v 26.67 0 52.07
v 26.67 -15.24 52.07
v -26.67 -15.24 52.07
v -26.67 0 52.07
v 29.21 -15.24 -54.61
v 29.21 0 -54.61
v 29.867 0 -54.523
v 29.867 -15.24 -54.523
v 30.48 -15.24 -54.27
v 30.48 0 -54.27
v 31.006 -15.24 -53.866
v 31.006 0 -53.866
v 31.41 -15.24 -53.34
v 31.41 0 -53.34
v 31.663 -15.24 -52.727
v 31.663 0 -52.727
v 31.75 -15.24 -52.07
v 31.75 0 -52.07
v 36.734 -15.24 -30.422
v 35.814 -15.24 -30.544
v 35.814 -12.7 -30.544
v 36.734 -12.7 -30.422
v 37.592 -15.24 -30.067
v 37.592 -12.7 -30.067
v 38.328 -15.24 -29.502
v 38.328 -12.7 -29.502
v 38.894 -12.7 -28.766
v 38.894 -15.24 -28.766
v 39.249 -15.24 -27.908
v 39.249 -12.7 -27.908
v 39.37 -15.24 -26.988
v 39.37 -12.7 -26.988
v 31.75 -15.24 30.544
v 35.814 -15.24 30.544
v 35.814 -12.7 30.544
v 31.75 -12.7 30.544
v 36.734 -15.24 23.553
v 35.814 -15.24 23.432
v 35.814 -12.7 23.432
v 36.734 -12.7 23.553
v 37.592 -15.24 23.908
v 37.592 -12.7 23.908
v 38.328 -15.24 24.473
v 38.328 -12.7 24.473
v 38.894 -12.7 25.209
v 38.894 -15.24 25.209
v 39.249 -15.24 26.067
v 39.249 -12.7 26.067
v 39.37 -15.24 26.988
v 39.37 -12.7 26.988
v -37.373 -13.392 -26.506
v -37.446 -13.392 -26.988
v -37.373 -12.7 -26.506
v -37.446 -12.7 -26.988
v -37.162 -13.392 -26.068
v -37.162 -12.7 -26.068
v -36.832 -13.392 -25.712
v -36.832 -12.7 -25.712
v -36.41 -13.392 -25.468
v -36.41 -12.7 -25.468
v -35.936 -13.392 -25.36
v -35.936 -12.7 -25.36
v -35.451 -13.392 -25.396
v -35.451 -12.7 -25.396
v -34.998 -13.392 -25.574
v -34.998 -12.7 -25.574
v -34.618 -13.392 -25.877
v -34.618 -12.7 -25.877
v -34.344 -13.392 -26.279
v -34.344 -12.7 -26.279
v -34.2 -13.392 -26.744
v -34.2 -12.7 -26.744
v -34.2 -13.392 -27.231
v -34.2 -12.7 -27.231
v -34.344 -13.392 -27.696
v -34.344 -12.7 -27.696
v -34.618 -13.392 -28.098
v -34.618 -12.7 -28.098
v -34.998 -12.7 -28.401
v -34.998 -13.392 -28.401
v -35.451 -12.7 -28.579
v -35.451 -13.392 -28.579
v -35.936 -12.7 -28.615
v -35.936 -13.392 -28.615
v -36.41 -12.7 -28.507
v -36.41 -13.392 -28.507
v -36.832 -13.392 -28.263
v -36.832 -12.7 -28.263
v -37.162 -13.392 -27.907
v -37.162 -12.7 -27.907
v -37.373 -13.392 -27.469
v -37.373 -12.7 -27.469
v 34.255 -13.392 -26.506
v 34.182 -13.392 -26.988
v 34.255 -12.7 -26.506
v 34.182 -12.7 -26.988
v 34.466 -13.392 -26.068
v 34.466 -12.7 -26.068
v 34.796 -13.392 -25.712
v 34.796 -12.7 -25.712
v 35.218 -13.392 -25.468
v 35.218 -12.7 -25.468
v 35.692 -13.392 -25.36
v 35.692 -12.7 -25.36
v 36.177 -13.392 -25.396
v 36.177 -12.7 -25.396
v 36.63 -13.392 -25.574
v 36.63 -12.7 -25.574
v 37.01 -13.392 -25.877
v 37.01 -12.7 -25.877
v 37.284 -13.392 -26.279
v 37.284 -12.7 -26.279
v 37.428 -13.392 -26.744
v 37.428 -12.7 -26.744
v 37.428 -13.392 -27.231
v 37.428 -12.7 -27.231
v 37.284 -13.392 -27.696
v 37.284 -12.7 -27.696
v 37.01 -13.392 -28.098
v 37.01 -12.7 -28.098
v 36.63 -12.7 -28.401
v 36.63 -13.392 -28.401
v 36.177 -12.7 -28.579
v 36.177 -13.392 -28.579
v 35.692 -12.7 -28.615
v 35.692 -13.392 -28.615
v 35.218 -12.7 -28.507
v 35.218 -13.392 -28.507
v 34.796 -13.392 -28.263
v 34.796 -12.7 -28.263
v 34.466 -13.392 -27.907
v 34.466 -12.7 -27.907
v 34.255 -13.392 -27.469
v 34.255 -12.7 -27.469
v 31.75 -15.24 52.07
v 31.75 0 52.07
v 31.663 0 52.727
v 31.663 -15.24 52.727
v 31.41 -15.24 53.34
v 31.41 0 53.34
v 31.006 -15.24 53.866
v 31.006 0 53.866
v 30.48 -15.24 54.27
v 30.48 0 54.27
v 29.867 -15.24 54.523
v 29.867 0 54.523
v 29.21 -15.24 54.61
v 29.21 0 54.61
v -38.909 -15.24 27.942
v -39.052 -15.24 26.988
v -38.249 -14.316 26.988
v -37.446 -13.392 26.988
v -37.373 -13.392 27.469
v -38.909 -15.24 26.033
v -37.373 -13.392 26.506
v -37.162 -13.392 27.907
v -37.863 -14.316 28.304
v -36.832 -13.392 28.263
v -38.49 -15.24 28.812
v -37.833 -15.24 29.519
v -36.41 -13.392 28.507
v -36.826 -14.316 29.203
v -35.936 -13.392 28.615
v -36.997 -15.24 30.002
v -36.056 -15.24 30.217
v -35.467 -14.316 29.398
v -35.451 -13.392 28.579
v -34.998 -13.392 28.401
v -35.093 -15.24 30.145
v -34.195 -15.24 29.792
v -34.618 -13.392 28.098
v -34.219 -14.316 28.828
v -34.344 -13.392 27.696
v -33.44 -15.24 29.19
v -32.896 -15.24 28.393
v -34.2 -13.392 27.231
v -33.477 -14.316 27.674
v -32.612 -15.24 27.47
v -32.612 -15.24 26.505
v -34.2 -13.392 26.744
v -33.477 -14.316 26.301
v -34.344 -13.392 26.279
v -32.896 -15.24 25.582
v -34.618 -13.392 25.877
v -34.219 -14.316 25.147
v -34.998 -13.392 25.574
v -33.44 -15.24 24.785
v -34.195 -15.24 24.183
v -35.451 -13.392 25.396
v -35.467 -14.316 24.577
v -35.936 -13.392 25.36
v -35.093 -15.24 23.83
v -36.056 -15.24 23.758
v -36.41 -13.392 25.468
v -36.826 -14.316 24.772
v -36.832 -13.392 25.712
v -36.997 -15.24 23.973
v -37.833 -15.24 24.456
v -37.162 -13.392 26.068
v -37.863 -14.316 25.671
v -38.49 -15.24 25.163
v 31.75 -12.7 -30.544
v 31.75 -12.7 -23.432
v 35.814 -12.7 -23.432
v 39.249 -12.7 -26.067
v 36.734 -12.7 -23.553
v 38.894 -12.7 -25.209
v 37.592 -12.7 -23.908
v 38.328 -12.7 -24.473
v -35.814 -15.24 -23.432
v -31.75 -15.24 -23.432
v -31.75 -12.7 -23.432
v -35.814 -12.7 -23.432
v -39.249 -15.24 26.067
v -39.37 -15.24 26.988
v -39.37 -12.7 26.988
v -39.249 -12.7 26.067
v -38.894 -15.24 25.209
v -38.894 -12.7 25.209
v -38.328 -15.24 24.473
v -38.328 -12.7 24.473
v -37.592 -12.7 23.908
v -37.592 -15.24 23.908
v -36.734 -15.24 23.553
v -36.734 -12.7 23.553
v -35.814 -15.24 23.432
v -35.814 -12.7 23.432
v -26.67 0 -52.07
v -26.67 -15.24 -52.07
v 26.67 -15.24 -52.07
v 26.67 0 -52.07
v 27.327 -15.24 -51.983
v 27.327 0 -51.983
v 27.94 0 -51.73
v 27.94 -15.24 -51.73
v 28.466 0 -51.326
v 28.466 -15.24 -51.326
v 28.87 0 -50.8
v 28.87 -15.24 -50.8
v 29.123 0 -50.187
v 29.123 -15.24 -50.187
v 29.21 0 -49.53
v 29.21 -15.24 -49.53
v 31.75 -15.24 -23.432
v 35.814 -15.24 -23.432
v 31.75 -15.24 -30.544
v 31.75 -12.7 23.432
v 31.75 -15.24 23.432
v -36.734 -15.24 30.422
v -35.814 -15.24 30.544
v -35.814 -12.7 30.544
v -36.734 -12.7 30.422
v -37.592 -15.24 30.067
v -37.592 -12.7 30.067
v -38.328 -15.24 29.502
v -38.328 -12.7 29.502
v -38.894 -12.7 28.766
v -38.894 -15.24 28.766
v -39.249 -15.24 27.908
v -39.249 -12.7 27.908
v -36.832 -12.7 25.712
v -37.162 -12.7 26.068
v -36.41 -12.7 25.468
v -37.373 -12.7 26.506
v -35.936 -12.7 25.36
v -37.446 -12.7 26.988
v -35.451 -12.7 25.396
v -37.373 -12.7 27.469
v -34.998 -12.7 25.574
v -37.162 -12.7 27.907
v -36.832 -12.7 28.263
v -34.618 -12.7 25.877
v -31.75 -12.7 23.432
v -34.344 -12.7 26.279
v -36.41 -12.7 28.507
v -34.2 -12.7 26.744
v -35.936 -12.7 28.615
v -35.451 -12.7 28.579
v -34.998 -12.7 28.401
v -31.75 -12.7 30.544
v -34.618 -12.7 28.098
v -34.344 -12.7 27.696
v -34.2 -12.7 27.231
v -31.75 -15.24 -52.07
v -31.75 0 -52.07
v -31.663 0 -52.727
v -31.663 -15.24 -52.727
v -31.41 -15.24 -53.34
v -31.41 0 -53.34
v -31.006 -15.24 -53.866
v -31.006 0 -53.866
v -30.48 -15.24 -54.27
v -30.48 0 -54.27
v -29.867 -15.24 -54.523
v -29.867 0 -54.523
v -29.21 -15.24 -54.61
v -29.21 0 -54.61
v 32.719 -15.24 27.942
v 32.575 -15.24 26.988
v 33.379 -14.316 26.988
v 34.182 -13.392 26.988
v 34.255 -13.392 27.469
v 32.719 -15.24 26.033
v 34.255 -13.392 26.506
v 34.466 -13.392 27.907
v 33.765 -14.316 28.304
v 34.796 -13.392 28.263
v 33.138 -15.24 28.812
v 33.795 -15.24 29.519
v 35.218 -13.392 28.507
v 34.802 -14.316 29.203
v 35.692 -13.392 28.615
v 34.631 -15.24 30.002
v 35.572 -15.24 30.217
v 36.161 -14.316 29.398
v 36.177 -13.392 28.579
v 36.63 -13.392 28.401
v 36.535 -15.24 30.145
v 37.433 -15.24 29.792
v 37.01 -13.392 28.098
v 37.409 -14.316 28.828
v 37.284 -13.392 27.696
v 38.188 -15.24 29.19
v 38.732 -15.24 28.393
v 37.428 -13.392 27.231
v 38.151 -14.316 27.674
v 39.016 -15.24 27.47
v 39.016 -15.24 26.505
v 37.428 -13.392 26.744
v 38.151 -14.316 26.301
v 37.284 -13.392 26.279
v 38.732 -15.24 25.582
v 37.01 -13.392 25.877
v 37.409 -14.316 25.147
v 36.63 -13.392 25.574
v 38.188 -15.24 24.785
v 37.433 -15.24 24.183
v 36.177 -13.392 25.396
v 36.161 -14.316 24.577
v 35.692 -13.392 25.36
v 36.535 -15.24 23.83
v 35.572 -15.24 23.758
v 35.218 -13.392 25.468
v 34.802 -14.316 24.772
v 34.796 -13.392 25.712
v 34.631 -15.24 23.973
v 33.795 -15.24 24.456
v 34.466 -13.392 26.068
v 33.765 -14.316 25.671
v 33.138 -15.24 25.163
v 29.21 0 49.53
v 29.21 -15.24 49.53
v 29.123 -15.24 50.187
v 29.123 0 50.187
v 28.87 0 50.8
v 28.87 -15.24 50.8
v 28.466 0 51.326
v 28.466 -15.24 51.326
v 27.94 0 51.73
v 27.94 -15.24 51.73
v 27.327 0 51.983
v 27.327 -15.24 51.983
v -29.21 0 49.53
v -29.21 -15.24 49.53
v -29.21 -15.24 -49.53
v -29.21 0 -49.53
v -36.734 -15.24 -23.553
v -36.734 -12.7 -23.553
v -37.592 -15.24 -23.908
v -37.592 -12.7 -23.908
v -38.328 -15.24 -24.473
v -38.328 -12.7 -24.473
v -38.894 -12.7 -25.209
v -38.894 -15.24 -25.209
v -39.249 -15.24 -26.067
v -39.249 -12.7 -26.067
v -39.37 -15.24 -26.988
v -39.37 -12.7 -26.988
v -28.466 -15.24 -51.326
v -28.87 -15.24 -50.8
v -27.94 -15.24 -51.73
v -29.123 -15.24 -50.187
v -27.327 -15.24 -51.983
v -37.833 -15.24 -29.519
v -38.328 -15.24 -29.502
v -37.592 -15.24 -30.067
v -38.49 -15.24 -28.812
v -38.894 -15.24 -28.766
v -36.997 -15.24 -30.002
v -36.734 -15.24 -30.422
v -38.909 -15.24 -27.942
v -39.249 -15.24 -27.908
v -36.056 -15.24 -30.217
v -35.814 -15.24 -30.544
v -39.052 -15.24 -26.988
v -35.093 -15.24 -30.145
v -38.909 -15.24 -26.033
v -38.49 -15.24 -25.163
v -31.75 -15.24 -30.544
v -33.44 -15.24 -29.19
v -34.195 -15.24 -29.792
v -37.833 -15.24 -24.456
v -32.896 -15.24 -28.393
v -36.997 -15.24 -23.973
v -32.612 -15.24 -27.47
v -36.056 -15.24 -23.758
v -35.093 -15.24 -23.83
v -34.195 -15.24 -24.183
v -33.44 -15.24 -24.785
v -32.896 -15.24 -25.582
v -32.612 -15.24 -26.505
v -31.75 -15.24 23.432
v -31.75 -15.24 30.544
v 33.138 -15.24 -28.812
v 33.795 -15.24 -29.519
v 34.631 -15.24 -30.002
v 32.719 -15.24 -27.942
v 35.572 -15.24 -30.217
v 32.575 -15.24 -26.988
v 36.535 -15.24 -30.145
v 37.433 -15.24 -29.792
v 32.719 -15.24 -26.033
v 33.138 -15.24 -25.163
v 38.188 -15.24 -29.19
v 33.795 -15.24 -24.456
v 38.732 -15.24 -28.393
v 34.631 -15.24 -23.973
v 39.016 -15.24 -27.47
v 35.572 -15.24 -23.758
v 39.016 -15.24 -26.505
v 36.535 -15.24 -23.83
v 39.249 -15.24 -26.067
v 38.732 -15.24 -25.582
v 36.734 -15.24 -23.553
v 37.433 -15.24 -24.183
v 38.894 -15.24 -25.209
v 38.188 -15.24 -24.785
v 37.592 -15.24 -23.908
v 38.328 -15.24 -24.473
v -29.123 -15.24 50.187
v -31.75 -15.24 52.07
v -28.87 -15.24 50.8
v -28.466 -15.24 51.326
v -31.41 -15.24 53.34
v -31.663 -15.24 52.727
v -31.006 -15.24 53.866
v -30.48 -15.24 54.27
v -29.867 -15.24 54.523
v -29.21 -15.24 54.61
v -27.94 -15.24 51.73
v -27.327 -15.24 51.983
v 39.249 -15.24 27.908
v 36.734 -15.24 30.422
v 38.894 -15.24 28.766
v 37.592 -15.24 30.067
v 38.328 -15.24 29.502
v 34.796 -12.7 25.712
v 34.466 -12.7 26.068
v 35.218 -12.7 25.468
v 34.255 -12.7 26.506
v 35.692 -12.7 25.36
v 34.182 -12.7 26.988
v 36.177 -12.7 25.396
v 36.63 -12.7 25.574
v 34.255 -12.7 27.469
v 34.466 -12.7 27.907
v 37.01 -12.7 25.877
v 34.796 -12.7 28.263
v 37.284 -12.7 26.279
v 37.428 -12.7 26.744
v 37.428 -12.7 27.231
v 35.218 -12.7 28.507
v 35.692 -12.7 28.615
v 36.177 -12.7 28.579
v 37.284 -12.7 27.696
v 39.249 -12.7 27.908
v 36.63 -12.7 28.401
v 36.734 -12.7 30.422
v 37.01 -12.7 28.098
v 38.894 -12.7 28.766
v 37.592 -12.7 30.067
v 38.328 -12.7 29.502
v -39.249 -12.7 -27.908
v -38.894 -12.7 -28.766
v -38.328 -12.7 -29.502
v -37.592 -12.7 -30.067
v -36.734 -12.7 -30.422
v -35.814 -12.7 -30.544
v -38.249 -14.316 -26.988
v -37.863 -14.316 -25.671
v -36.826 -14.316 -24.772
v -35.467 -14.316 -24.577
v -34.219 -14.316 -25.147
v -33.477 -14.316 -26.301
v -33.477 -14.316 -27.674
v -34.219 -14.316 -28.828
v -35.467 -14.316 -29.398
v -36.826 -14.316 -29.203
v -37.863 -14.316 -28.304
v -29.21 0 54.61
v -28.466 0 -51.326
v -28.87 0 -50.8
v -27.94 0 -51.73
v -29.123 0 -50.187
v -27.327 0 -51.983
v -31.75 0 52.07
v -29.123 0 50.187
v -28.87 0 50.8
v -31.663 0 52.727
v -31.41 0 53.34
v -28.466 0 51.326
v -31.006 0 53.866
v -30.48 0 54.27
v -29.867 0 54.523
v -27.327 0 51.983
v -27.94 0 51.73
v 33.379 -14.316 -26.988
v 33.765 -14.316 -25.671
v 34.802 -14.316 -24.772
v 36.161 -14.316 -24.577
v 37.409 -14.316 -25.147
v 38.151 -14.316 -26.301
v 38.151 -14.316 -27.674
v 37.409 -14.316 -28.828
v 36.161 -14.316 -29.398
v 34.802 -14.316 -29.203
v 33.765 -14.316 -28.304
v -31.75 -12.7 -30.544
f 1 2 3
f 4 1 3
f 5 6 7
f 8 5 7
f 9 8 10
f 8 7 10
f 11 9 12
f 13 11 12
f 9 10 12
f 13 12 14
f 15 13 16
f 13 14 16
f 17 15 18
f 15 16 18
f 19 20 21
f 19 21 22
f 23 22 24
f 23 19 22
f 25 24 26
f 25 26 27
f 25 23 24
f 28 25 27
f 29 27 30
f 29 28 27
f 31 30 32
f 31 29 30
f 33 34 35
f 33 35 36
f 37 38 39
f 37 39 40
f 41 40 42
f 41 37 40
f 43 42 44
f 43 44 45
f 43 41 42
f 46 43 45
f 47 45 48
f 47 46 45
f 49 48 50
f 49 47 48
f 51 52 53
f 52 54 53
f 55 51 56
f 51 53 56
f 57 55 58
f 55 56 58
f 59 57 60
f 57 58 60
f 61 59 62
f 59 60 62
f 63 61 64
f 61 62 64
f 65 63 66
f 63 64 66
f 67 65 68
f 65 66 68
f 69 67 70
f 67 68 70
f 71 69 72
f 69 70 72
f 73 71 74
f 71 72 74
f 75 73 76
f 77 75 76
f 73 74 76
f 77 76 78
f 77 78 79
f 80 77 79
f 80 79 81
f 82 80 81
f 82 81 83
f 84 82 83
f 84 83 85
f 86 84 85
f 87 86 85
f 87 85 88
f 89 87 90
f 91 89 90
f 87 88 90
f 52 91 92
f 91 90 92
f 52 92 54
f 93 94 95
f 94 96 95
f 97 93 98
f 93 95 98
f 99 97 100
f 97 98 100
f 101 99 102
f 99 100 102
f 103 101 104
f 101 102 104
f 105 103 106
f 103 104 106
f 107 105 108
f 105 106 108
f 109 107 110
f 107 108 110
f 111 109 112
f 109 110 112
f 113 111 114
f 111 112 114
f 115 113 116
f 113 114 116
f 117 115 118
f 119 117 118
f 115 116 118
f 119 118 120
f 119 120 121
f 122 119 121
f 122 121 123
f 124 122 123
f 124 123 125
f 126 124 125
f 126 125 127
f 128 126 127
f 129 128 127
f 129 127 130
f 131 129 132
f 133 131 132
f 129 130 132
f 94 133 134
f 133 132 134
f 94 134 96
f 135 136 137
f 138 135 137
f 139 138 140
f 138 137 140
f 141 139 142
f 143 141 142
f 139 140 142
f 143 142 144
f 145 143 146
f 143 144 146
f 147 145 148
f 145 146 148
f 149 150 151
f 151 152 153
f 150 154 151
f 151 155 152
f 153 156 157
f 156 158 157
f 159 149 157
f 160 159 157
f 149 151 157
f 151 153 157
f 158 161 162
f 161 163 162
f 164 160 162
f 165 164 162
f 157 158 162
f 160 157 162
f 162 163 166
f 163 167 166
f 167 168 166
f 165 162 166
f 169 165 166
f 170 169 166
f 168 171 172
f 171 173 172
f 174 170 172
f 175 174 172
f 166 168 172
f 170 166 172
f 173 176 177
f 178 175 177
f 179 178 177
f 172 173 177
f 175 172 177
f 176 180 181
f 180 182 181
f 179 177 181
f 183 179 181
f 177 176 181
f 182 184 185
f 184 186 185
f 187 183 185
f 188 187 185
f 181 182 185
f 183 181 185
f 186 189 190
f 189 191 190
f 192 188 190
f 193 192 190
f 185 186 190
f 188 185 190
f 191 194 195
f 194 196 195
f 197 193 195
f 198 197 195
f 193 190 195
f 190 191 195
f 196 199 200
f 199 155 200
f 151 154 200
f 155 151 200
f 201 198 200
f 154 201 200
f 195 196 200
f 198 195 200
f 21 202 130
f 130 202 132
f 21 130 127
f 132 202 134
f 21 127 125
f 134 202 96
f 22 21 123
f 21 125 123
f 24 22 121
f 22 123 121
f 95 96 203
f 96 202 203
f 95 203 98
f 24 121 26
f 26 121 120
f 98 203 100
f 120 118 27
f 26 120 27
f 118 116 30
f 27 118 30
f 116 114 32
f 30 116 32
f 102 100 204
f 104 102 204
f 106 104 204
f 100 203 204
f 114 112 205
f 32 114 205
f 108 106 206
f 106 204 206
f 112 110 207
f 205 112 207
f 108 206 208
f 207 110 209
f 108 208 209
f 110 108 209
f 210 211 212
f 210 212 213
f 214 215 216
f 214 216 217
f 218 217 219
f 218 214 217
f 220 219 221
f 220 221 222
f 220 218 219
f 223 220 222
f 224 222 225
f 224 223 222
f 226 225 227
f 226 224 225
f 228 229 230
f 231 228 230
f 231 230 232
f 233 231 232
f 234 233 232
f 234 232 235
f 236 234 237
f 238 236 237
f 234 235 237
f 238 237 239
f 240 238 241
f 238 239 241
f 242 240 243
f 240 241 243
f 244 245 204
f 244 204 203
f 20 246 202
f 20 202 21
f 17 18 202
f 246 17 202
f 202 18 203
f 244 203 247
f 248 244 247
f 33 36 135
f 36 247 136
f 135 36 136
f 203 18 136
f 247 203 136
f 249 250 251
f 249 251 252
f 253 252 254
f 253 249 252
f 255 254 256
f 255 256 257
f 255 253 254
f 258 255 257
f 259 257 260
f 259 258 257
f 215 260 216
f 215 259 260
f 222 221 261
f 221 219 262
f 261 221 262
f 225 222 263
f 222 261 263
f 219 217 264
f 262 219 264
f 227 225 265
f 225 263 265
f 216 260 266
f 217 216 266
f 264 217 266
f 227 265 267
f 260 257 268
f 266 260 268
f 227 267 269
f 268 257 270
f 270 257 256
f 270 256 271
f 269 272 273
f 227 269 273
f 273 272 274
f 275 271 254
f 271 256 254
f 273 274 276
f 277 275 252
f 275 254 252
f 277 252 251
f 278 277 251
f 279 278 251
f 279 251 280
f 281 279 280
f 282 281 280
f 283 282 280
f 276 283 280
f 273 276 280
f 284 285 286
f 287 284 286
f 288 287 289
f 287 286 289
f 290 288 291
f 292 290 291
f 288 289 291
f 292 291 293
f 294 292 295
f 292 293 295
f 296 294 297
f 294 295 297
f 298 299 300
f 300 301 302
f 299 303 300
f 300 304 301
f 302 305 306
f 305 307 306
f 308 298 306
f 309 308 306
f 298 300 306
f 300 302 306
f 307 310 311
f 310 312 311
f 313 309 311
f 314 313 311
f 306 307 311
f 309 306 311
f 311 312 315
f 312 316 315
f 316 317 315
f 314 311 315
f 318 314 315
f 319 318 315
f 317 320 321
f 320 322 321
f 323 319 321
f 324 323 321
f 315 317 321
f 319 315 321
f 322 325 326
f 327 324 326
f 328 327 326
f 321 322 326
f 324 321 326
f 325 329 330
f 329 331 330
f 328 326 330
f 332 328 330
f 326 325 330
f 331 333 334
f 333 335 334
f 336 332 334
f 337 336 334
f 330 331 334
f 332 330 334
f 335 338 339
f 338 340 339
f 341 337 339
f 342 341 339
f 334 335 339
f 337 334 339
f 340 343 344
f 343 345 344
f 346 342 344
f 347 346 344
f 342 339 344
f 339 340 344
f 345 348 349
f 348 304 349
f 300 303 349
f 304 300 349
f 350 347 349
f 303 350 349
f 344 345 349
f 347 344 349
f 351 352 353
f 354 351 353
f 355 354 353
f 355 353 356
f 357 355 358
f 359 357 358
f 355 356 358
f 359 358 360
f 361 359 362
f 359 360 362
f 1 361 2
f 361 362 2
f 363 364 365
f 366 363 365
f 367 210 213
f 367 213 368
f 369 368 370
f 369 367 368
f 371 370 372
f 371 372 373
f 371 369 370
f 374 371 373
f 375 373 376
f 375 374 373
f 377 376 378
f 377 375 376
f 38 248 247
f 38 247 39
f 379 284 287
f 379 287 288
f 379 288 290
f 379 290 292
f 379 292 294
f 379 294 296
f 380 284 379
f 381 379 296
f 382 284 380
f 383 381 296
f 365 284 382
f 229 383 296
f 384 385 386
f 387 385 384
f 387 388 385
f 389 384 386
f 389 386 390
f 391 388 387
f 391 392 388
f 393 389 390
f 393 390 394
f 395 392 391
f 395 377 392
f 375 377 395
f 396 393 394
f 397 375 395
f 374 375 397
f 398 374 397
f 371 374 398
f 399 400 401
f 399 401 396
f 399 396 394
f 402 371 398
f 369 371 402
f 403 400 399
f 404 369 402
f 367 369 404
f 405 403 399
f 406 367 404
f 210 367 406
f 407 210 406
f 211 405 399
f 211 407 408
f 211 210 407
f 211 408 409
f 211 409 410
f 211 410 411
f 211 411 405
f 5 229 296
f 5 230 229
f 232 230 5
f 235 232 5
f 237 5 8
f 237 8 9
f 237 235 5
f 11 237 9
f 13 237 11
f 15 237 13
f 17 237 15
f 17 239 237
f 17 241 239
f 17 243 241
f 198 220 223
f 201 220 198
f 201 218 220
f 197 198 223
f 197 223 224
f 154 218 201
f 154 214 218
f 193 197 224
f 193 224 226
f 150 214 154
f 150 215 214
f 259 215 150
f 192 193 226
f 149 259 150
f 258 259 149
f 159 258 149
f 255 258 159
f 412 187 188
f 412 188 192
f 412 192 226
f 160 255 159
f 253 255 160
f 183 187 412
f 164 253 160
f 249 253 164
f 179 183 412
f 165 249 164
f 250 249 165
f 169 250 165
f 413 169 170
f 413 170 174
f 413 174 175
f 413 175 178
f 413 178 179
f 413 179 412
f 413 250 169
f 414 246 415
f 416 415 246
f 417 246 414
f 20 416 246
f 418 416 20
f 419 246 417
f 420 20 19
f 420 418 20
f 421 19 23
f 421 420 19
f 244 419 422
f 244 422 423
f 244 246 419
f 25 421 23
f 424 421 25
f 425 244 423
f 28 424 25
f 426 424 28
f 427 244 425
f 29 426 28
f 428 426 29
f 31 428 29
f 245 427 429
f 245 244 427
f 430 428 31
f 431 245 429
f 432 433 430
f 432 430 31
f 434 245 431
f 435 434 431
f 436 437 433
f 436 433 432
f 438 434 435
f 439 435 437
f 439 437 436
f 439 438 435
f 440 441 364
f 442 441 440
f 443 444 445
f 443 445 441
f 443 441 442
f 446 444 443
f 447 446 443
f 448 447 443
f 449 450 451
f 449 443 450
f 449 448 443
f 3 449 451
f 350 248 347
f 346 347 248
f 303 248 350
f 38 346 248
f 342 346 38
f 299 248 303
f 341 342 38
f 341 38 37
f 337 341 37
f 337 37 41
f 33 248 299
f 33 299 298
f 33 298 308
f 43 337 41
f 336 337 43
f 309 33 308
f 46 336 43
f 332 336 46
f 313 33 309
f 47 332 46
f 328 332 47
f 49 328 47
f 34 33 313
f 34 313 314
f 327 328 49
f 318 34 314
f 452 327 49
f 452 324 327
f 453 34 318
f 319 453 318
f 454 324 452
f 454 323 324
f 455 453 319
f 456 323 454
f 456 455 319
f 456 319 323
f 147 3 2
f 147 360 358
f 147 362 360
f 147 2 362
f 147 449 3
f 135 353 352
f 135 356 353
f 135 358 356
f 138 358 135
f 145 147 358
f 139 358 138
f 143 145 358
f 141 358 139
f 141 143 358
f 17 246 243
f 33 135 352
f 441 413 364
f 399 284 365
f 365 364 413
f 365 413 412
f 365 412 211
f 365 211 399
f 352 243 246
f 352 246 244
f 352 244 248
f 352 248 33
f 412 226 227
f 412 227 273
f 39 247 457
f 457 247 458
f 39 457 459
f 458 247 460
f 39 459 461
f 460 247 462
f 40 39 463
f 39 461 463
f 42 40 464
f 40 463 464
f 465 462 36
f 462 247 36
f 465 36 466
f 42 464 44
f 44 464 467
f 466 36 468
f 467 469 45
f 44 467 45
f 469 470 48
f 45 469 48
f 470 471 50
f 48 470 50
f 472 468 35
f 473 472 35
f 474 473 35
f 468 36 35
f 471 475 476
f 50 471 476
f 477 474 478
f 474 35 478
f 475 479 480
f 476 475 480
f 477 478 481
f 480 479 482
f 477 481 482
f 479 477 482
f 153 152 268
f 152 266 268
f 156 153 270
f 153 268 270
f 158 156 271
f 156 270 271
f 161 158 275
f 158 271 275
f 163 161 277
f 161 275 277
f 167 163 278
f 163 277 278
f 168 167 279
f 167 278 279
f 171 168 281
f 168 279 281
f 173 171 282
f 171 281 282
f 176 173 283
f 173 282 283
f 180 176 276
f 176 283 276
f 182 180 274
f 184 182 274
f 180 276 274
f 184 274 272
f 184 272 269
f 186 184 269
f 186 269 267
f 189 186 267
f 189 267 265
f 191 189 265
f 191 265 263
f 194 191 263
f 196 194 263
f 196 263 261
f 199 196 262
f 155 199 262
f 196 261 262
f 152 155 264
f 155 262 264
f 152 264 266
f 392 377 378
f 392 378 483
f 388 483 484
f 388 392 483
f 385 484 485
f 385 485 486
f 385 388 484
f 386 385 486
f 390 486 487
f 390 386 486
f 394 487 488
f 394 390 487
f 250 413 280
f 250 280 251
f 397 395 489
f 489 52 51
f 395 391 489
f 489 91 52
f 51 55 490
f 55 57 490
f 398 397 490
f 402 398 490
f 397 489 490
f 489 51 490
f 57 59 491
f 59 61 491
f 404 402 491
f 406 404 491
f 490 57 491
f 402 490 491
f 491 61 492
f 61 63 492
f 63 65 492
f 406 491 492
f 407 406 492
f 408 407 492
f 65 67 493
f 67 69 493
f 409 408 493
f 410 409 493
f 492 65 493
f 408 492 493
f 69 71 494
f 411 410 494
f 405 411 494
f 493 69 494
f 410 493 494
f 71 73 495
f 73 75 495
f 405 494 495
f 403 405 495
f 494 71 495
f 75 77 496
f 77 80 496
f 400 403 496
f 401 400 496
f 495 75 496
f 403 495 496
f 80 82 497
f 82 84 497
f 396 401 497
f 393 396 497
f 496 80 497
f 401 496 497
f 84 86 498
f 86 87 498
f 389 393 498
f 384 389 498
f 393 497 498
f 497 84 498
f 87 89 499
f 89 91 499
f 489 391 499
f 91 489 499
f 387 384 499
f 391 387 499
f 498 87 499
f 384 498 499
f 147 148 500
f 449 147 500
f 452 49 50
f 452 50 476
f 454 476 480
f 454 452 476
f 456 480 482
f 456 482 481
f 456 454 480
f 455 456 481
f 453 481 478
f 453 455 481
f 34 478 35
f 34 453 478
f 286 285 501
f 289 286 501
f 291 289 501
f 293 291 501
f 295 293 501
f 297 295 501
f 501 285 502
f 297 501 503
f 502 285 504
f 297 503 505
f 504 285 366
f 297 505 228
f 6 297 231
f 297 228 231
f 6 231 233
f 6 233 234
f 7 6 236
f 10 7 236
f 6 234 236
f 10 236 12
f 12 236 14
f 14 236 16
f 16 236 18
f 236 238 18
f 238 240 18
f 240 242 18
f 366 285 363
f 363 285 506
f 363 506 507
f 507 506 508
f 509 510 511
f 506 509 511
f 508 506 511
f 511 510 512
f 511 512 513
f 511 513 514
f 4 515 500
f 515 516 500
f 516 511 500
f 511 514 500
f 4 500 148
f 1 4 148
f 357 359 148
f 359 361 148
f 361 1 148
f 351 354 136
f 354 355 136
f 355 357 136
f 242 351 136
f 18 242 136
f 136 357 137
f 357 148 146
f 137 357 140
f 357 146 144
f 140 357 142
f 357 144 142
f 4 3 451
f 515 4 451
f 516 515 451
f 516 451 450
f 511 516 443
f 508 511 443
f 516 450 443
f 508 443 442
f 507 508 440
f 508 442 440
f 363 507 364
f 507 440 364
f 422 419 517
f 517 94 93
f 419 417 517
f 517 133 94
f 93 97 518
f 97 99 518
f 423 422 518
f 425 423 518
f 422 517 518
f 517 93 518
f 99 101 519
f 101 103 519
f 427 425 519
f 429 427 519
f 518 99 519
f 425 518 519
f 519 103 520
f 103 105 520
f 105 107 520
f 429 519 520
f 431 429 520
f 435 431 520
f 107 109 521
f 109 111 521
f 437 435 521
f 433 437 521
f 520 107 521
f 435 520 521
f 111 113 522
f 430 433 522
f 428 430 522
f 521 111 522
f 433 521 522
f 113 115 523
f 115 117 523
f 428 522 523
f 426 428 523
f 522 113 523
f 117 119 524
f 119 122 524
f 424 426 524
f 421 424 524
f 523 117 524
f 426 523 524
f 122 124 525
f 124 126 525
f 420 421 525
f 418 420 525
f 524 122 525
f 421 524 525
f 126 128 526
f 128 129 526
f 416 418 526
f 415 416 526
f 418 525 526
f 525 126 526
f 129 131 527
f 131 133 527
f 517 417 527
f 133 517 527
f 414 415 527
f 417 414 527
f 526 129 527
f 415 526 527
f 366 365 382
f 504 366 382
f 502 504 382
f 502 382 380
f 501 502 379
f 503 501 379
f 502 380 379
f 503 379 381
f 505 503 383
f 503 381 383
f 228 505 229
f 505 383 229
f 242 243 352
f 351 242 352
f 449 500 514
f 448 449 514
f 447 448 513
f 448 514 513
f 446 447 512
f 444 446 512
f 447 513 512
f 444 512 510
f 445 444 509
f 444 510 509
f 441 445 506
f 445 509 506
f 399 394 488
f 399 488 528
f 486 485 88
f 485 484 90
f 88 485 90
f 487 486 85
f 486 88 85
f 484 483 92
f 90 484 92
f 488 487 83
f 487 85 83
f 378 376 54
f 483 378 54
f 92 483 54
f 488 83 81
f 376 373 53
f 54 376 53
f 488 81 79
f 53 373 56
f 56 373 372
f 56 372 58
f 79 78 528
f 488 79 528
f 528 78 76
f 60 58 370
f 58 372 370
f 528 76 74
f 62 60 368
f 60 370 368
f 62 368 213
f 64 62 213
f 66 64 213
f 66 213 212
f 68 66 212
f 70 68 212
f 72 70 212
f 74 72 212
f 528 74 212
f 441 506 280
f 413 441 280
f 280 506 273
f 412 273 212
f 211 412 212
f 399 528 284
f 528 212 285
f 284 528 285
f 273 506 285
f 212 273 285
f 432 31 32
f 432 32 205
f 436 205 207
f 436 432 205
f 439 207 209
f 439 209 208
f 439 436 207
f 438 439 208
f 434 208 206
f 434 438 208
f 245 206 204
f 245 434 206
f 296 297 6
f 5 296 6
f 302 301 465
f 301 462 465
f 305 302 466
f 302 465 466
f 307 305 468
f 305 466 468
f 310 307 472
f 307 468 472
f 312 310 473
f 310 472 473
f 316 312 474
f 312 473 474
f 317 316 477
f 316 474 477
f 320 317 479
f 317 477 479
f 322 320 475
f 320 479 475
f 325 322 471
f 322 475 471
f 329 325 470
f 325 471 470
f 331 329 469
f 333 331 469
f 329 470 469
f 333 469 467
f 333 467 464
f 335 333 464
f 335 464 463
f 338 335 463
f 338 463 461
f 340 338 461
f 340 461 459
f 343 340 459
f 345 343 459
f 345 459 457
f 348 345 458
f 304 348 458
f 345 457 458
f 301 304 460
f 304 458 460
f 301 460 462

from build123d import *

# Parameters (mm, degrees)
F1_DEPTH       = 15.24
F3_DEPTH       = 2.54
F5_D           = 3.2639
F5_CSINK_D     = 6.477
F5_CSINK_ANGLE = 82
F7_DEPTH       = 15.241


with BuildPart() as f1:
    # F0 (on Front) → F1 (new body)
    with BuildSketch(Plane.XZ):
        with BuildLine():
            ThreePointArc((-31.75, -52.07), (-31.0060512242, -53.8660512242), (-29.21, -54.61))
            Line((-29.21, -54.61), (29.21, -54.61))
            ThreePointArc((29.21, -54.61), (31.0060512242, -53.8660512242), (31.75, -52.07))
            Line((31.75, -52.07), (31.75, 52.07))
            ThreePointArc((31.75, 52.07), (31.0060512242, 53.8660512242), (29.21, 54.61))
            Line((29.21, 54.61), (-29.21, 54.61))
            ThreePointArc((-29.21, 54.61), (-31.0060512242, 53.8660512242), (-31.75, 52.07))
            Line((-31.75, 52.07), (-31.75, -52.07))
        make_face()
    extrude(amount=F1_DEPTH)

    # F2 (on face) → F3 (join)
    with BuildSketch(Plane.XZ.offset(15.24)):
        with BuildLine():
            Line((-31.75, 23.4315), (-31.75, 30.5435))
            Line((-31.75, 30.5435), (-35.814, 30.5435))
            ThreePointArc((-35.814, 30.5435), (-38.3284717139, 29.5019717139), (-39.37, 26.9875))
            ThreePointArc((-39.37, 26.9875), (-38.3284717139, 24.4730282861), (-35.814, 23.4315))
            Line((-35.814, 23.4315), (-31.75, 23.4315))
        make_face()
        with BuildLine():
            Line((-31.75, -30.5435), (-31.75, -23.4315))
            Line((-31.75, -23.4315), (-35.814, -23.4315))
            ThreePointArc((-35.814, -23.4315), (-38.3284717139, -24.4730282861), (-39.37, -26.9875))
            ThreePointArc((-39.37, -26.9875), (-38.3284717139, -29.5019717139), (-35.814, -30.5435))
            Line((-35.814, -30.5435), (-31.75, -30.5435))
        make_face()
        with BuildLine():
            Line((35.814, 30.5435), (31.75, 30.5435))
            Line((31.75, 30.5435), (31.75, 23.4315))
            Line((31.75, 23.4315), (35.814, 23.4315))
            ThreePointArc((35.814, 23.4315), (38.3284717139, 24.4730282861), (39.37, 26.9875))
            ThreePointArc((39.37, 26.9875), (38.3284717139, 29.5019717139), (35.814, 30.5435))
        make_face()
        with BuildLine():
            Line((31.75, -23.4315), (31.75, -30.5435))
            Line((31.75, -30.5435), (35.814, -30.5435))
            ThreePointArc((35.814, -30.5435), (38.3284717139, -29.5019717139), (39.37, -26.9875))
            ThreePointArc((39.37, -26.9875), (38.3284717139, -24.4730282861), (35.814, -23.4315))
            Line((35.814, -23.4315), (31.75, -23.4315))
        make_face()
    extrude(amount=-F3_DEPTH)

    # F5 (through all)
    with Locations(Plane.XZ.offset(15.24)):
        with Locations((-35.814, 26.9875), (-35.814, -26.9875), (35.814, 26.9875), (35.814, -26.9875)):
            CounterSinkHole(F5_D / 2, F5_CSINK_D / 2, counter_sink_angle=F5_CSINK_ANGLE)

    # F6 (on face) → F7 (cut, through all)
    with BuildSketch(Plane.XZ.offset(15.24)):
        with BuildLine():
            Line((-26.67, -52.07), (26.67, -52.07))
            ThreePointArc((26.67, -52.07), (28.4660512242, -51.3260512242), (29.21, -49.53))
            Line((29.21, -49.53), (29.21, 49.53))
            ThreePointArc((29.21, 49.53), (28.4660512242, 51.3260512242), (26.67, 52.07))
            Line((26.67, 52.07), (-26.67, 52.07))
            ThreePointArc((-26.67, 52.07), (-28.4660512242, 51.3260512242), (-29.21, 49.53))
            Line((-29.21, 49.53), (-29.21, -49.53))
            ThreePointArc((-29.21, -49.53), (-28.4660512242, -51.3260512242), (-26.67, -52.07))
        make_face()
    extrude(amount=-F7_DEPTH, mode=Mode.SUBTRACT)


solid = f1.part
